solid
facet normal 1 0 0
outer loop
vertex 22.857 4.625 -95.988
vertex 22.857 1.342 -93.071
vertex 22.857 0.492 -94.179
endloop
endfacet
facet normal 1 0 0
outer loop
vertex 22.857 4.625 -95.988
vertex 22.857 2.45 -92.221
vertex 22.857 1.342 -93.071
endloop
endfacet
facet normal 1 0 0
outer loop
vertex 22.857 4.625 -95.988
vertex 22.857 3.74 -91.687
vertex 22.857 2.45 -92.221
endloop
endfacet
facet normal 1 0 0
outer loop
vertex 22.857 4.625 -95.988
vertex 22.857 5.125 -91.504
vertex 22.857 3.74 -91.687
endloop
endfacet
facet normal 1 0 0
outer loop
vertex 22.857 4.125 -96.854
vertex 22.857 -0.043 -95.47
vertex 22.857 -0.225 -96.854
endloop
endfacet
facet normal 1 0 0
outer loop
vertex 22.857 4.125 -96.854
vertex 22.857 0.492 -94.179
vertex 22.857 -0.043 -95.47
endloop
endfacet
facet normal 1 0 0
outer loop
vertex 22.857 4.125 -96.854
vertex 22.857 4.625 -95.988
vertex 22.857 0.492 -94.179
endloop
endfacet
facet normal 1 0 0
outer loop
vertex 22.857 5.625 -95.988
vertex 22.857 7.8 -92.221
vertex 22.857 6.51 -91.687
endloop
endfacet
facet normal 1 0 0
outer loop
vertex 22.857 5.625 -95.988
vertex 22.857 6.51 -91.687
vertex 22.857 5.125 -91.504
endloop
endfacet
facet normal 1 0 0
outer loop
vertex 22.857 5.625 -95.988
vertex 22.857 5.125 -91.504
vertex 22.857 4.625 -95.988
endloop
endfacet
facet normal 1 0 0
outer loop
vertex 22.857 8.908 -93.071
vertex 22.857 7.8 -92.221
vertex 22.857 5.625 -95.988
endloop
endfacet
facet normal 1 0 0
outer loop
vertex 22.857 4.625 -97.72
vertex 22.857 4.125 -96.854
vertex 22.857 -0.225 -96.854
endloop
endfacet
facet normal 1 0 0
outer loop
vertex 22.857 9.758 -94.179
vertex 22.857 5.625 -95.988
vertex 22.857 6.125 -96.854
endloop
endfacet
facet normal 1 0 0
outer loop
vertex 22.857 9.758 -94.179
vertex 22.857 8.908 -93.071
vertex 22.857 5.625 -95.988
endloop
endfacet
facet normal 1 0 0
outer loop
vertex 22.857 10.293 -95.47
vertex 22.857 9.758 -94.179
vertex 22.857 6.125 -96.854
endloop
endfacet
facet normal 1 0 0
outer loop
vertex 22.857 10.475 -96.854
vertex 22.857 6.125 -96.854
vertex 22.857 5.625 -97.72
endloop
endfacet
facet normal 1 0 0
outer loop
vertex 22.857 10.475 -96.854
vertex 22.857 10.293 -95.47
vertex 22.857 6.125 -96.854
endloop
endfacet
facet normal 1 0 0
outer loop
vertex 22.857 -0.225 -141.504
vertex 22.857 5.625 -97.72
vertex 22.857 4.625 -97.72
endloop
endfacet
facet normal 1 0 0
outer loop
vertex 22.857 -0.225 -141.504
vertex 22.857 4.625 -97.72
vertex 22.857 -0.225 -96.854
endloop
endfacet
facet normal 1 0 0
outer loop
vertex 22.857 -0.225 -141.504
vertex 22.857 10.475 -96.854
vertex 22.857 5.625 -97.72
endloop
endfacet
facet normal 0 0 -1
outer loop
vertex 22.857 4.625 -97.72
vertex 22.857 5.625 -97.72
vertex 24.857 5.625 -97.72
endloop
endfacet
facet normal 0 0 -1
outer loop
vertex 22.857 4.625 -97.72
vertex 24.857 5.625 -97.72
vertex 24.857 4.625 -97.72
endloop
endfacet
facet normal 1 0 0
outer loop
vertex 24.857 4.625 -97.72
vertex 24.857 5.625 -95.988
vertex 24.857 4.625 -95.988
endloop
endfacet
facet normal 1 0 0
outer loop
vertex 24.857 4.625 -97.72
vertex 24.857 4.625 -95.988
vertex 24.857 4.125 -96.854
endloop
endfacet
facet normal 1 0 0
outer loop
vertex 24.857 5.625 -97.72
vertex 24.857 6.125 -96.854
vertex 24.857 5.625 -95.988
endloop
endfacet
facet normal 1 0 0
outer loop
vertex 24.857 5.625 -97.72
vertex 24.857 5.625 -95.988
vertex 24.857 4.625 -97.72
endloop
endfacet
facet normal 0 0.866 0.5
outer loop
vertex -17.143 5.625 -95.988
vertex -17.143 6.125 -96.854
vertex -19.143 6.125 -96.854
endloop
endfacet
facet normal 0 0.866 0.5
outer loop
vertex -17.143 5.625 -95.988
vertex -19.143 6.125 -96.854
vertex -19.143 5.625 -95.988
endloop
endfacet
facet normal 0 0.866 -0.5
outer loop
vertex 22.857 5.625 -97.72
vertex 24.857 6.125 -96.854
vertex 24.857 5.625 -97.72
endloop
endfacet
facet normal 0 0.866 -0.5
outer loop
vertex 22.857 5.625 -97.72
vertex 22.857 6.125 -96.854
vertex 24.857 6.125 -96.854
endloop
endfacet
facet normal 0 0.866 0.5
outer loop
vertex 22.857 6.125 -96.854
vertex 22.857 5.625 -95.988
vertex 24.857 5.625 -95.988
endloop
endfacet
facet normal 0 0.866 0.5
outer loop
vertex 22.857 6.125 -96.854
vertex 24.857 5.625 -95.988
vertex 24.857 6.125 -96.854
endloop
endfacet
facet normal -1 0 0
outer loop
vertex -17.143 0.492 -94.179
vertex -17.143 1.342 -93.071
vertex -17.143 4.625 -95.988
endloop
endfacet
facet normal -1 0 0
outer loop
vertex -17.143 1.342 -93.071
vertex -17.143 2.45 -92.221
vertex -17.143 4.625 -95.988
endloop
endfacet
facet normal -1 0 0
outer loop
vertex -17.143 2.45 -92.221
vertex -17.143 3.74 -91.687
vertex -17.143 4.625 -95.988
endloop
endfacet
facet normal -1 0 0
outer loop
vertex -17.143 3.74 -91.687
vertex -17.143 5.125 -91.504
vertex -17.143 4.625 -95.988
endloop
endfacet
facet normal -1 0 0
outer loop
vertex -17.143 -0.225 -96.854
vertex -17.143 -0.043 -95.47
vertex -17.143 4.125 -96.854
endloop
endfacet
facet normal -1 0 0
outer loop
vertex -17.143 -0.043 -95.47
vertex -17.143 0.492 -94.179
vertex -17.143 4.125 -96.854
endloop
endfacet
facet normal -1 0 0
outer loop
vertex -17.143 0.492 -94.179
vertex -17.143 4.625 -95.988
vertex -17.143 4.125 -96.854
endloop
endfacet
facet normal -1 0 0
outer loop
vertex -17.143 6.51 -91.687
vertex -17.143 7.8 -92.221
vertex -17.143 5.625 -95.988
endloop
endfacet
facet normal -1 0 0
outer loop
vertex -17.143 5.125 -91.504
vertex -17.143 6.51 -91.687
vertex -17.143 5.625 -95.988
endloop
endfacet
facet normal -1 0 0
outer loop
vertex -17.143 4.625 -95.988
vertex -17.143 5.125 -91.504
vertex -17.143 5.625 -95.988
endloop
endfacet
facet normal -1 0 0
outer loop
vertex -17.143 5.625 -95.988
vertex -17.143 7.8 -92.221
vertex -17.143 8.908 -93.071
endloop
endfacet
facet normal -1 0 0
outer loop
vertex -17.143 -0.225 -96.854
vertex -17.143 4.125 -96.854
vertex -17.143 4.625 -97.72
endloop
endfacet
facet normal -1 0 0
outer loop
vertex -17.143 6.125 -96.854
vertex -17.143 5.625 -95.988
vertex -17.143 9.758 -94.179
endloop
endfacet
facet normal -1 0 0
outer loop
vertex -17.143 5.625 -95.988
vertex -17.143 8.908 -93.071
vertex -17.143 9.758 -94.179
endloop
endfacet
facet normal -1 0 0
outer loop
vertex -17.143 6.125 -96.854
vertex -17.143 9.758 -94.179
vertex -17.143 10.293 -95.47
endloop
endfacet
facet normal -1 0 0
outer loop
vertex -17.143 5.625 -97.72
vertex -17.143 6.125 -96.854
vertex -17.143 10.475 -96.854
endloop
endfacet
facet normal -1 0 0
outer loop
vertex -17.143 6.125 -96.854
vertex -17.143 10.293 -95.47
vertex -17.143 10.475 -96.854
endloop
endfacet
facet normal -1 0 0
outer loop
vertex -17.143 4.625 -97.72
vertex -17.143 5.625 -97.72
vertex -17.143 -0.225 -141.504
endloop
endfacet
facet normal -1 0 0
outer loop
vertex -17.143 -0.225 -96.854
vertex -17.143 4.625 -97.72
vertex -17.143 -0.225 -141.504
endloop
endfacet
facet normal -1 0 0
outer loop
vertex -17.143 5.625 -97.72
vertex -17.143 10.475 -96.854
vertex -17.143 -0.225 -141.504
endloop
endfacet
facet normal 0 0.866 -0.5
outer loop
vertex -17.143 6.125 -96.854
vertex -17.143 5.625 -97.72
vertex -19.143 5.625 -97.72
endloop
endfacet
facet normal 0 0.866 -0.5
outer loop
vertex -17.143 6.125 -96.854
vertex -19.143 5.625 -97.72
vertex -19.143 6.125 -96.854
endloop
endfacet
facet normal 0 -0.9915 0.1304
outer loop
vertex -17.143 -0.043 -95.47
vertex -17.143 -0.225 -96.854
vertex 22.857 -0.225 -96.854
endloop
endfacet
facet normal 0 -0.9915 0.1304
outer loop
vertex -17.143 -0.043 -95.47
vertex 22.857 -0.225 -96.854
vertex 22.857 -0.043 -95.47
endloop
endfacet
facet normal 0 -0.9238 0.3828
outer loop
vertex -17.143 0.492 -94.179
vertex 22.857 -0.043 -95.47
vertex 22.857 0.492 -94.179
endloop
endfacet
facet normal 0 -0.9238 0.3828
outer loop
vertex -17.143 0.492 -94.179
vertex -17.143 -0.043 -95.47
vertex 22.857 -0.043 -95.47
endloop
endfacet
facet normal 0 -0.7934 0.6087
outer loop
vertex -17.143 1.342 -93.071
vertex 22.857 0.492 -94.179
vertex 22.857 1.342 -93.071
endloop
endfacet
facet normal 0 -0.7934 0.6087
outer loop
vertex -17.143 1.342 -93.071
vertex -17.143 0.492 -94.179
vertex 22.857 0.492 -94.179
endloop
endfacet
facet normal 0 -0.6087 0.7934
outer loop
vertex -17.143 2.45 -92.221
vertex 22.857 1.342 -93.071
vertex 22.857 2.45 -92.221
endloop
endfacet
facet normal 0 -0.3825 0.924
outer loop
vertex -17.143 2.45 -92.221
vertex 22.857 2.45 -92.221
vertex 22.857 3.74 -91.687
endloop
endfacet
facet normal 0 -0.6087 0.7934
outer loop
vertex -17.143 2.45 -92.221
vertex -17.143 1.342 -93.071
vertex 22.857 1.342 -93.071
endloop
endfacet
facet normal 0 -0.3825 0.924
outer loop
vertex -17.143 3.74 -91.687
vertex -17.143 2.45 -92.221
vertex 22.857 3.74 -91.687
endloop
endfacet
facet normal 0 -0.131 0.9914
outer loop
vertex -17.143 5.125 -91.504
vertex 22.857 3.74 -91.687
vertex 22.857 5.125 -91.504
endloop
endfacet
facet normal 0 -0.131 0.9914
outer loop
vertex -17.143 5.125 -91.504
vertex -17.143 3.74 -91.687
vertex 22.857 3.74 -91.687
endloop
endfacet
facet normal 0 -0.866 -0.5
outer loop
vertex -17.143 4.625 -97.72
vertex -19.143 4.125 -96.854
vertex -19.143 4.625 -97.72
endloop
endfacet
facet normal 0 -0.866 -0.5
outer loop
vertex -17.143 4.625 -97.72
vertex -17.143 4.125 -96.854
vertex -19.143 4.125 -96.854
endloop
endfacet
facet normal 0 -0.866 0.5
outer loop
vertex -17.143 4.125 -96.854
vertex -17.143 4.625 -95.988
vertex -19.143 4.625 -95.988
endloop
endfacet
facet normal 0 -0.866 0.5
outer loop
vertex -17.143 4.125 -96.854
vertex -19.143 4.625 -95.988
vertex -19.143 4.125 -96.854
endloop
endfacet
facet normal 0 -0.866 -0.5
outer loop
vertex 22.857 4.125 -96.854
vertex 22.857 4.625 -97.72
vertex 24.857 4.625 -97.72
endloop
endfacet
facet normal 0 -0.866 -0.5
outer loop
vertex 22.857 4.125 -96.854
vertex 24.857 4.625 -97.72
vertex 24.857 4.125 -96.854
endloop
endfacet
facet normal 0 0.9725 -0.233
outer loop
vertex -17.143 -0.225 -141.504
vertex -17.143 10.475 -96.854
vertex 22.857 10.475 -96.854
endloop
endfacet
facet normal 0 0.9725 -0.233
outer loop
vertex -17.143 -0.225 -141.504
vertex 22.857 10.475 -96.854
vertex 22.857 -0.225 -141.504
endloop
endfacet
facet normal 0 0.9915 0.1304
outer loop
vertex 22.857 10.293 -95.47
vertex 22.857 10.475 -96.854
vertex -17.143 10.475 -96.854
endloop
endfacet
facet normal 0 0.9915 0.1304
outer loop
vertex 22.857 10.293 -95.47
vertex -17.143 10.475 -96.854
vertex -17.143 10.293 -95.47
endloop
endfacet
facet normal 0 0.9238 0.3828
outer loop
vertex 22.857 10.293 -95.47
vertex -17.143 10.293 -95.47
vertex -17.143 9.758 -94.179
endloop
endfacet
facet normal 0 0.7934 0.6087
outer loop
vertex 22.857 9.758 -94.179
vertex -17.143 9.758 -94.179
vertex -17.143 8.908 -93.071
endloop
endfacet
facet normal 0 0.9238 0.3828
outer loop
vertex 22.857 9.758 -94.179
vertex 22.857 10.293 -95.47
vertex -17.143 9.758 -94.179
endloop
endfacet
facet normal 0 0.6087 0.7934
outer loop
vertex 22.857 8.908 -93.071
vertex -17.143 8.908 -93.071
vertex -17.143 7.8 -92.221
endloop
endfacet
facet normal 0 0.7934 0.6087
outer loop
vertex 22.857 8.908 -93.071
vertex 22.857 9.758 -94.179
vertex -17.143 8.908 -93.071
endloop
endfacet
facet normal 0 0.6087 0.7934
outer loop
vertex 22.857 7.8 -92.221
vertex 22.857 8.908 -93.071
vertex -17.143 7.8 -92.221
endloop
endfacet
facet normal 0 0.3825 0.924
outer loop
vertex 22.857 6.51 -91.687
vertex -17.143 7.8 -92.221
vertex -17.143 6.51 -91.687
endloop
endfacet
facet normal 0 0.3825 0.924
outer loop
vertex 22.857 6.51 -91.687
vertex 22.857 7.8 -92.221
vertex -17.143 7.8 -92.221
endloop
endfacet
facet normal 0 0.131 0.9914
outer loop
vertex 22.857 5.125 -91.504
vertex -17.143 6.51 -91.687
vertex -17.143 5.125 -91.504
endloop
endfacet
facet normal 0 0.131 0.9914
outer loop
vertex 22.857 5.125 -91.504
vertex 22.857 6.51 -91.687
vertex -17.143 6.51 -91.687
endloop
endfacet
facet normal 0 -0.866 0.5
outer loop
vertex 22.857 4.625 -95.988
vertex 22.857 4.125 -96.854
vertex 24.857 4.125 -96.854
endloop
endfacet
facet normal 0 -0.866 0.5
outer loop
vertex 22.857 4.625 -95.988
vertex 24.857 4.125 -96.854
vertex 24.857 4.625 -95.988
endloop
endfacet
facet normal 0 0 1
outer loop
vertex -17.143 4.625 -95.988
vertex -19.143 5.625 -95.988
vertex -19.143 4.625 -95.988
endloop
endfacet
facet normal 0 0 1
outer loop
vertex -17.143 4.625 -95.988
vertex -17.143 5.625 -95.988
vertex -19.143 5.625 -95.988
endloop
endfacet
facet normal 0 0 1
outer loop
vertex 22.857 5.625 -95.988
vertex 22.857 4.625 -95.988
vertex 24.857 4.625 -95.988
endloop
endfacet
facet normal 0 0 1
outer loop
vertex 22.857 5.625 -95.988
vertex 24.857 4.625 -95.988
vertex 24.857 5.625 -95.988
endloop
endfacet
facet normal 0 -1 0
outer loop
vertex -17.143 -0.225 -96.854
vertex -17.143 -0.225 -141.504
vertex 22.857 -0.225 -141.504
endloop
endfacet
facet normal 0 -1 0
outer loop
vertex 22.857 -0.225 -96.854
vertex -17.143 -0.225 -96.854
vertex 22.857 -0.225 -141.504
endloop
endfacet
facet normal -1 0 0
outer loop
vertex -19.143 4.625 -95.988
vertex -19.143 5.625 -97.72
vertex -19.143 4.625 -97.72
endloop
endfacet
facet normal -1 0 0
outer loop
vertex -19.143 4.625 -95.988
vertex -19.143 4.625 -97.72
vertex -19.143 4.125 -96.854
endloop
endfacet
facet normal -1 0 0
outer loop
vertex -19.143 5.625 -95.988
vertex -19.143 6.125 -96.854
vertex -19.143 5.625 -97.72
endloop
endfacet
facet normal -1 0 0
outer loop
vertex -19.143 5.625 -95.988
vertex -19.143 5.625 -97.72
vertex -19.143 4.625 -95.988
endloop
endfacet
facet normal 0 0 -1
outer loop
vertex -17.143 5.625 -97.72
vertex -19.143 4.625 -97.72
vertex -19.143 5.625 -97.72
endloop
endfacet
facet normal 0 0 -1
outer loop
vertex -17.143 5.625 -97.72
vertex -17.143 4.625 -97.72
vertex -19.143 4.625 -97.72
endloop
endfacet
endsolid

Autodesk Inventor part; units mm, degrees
ref_plane "YZ Plane" through (0, 0, 0) normal (1, 0, 0) x (0, 1, 0)
ref_plane "XZ Plane" through (0, 0, 0) normal (0, 1, 0) x (-1, 0, 0)
ref_plane "XY Plane" through (0, 0, 0) normal (0, 0, 1) x (1, 0, 0)
sketch "Sketch1" plane through (0, 0, 0) normal (0, 1, 0) x (-1, 0, 0)
  line L0 (17.1429, -30) -> (-22.8571, -30)
  line L1 (-22.8571, -30) -> (-22.8571, -80)
  line L2 (-22.8571, -80) -> (17.1429, -80)
  line L3 (17.1429, -80) -> (17.1429, -30)
  point P0 (0, 0)
  dimension "d0" = 40
  dimension "d1" = 50
extrude "Extrusion1" add sketch "Sketch1" along normal blind 10.475
sketch "Sketch3" plane through (22.8571, 0, -80) normal (0, 0, -1) x (-1, 0, 0)
  line L0 (0, 0) -> (40, 0) projected
  line L1 (0, 10.475) -> (40, 10.475)
  line L2 (40, 10.475) -> (40, 0)
  line L3 (40, 0) -> (0, 0)
  line L4 (0, 0) -> (0, 10.475)
  point P0 (22.8571, 0)
extrude "Extrusion3" add sketch "Sketch3" along normal blind 11.252
full round fillet "Fillet1" first side at (9.5238, 10.475, -50.4173) centre faces at (9.5238, 3.4917, -91.252) second side at (9.5238, 0, -70.8347)
sketch "Sketch6" plane through (0, 0, 0) normal (0, -1, 0) x (1, 0, 0)
  line L0 (22.8571, -30) -> (22.8571, -86.0145) projected
  line L1 (-17.1429, -91.252) -> (-17.1429, -86.0145) projected
  line L2 (22.8571, -30) -> (-17.1429, -30)
  line L3 (-17.1429, -30) -> (-17.1429, -91.252)
  line L4 (-17.1429, -91.252) -> (22.8571, -91.252)
  line L5 (22.8571, -91.252) -> (22.8571, -30)
  point P0 (0, 0)
extrude "Extrusion5" cut sketch "Sketch6" against normal blind 10.7
ref_plane "Work Plane5" through (0, 10.475, 0) normal (0, -1, 0) x (1, 0, 0)
sketch "Sketch8" plane through (0, 10.475, 0) normal (0, -1, 0) x (1, 0, 0)
  line L0 (-0.1429, -97) -> (-0.1429, -83) projected
  line L1 (-0.1429, -91.5044) -> (22.8571, -91.5044)
  line L2 (22.8571, -91.5044) -> (22.8571, -141.5044)
  line L3 (22.8571, -141.5044) -> (-0.1429, -141.5044)
  line L4 (-0.1429, -141.5044) -> (-0.1429, -91.5044)
  line L5 (-0.1429, -91.5044) -> (-17.1429, -91.5044)
  line L6 (-17.1429, -91.5044) -> (-17.1429, -141.5044)
  line L7 (-17.1429, -141.5044) -> (-0.1429, -141.5044)
  line L8 (-0.1429, -141.5044) -> (-0.1429, -91.5044)
  point P0 (0, 0)
  dimension "d14" = 23
  dimension "d15" = 50
  dimension "d16" = 17
extrude "Extrusion6" add sketch "Sketch8" along normal blind 10.7
full round fillet "Fillet2" first side at (15.1905, 10.475, -124.8377) centre faces at (15.1905, 6.9083, -91.5044) second side at (15.1905, -0.225, -124.8377)
sketch "Sketch9" plane through (-17.1429, -0.225, -141.5044) normal (-1, 0, 0) x (0, 0, 1)
  line L0 (0, 10.7) -> (44.65, 10.7) projected
  line L1 (0, 10.7) -> (0, 0) projected
  line L2 (44.65, 10.7) -> (0, 0)
  line L3 (0, 0) -> (0, 10.7)
  arc A0 (44.65, 0) -> (44.65, 10.7) centre (44.65, 5.35) ccw projected
  line L4 (0, 10.7) -> (44.65, 10.7)
  point P0 (141.5044, 0.225)
extrude "Extrusion7" cut sketch "Sketch9" against normal blind 40
sketch "Sketch10" plane through (-17.1429, 5.125, -96.8544) normal (-1, 0, 0) x (0, 0, 1)
  line L0 (0, -1) -> (-0.866, -0.5)
  line L1 (-0.866, -0.5) -> (-0.866, 0.5)
  line L2 (-0.866, 0.5) -> (0, 1)
  line L3 (0, 1) -> (0.866, 0.5)
  line L4 (0.866, 0.5) -> (0.866, -0.5)
  line L5 (0.866, -0.5) -> (0, -1)
  point P0 (96.8544, -5.125)
  point P1 (0, 0)
extrude "Extrusion8" add sketch "Sketch10" along normal blind 2
sketch "Sketch11" plane through (22.8571, 5.125, -96.8544) normal (1, 0, 0) x (0, 0, -1)
  line L0 (0, -1) -> (-0.866, -0.5) projected
  line L1 (0, -1) -> (-0.866, -0.5)
  line L2 (-0.866, -0.5) -> (-0.866, 0.5)
  line L3 (-0.866, 0.5) -> (0, 1)
  line L4 (0, 1) -> (0.866, 0.5)
  line L5 (0.866, 0.5) -> (0.866, -0.5)
  line L6 (0.866, -0.5) -> (0, -1)
  point P0 (-96.8544, -5.125)
  point P1 (0, 0)
extrude "Extrusion9" add sketch "Sketch11" along normal blind 2
